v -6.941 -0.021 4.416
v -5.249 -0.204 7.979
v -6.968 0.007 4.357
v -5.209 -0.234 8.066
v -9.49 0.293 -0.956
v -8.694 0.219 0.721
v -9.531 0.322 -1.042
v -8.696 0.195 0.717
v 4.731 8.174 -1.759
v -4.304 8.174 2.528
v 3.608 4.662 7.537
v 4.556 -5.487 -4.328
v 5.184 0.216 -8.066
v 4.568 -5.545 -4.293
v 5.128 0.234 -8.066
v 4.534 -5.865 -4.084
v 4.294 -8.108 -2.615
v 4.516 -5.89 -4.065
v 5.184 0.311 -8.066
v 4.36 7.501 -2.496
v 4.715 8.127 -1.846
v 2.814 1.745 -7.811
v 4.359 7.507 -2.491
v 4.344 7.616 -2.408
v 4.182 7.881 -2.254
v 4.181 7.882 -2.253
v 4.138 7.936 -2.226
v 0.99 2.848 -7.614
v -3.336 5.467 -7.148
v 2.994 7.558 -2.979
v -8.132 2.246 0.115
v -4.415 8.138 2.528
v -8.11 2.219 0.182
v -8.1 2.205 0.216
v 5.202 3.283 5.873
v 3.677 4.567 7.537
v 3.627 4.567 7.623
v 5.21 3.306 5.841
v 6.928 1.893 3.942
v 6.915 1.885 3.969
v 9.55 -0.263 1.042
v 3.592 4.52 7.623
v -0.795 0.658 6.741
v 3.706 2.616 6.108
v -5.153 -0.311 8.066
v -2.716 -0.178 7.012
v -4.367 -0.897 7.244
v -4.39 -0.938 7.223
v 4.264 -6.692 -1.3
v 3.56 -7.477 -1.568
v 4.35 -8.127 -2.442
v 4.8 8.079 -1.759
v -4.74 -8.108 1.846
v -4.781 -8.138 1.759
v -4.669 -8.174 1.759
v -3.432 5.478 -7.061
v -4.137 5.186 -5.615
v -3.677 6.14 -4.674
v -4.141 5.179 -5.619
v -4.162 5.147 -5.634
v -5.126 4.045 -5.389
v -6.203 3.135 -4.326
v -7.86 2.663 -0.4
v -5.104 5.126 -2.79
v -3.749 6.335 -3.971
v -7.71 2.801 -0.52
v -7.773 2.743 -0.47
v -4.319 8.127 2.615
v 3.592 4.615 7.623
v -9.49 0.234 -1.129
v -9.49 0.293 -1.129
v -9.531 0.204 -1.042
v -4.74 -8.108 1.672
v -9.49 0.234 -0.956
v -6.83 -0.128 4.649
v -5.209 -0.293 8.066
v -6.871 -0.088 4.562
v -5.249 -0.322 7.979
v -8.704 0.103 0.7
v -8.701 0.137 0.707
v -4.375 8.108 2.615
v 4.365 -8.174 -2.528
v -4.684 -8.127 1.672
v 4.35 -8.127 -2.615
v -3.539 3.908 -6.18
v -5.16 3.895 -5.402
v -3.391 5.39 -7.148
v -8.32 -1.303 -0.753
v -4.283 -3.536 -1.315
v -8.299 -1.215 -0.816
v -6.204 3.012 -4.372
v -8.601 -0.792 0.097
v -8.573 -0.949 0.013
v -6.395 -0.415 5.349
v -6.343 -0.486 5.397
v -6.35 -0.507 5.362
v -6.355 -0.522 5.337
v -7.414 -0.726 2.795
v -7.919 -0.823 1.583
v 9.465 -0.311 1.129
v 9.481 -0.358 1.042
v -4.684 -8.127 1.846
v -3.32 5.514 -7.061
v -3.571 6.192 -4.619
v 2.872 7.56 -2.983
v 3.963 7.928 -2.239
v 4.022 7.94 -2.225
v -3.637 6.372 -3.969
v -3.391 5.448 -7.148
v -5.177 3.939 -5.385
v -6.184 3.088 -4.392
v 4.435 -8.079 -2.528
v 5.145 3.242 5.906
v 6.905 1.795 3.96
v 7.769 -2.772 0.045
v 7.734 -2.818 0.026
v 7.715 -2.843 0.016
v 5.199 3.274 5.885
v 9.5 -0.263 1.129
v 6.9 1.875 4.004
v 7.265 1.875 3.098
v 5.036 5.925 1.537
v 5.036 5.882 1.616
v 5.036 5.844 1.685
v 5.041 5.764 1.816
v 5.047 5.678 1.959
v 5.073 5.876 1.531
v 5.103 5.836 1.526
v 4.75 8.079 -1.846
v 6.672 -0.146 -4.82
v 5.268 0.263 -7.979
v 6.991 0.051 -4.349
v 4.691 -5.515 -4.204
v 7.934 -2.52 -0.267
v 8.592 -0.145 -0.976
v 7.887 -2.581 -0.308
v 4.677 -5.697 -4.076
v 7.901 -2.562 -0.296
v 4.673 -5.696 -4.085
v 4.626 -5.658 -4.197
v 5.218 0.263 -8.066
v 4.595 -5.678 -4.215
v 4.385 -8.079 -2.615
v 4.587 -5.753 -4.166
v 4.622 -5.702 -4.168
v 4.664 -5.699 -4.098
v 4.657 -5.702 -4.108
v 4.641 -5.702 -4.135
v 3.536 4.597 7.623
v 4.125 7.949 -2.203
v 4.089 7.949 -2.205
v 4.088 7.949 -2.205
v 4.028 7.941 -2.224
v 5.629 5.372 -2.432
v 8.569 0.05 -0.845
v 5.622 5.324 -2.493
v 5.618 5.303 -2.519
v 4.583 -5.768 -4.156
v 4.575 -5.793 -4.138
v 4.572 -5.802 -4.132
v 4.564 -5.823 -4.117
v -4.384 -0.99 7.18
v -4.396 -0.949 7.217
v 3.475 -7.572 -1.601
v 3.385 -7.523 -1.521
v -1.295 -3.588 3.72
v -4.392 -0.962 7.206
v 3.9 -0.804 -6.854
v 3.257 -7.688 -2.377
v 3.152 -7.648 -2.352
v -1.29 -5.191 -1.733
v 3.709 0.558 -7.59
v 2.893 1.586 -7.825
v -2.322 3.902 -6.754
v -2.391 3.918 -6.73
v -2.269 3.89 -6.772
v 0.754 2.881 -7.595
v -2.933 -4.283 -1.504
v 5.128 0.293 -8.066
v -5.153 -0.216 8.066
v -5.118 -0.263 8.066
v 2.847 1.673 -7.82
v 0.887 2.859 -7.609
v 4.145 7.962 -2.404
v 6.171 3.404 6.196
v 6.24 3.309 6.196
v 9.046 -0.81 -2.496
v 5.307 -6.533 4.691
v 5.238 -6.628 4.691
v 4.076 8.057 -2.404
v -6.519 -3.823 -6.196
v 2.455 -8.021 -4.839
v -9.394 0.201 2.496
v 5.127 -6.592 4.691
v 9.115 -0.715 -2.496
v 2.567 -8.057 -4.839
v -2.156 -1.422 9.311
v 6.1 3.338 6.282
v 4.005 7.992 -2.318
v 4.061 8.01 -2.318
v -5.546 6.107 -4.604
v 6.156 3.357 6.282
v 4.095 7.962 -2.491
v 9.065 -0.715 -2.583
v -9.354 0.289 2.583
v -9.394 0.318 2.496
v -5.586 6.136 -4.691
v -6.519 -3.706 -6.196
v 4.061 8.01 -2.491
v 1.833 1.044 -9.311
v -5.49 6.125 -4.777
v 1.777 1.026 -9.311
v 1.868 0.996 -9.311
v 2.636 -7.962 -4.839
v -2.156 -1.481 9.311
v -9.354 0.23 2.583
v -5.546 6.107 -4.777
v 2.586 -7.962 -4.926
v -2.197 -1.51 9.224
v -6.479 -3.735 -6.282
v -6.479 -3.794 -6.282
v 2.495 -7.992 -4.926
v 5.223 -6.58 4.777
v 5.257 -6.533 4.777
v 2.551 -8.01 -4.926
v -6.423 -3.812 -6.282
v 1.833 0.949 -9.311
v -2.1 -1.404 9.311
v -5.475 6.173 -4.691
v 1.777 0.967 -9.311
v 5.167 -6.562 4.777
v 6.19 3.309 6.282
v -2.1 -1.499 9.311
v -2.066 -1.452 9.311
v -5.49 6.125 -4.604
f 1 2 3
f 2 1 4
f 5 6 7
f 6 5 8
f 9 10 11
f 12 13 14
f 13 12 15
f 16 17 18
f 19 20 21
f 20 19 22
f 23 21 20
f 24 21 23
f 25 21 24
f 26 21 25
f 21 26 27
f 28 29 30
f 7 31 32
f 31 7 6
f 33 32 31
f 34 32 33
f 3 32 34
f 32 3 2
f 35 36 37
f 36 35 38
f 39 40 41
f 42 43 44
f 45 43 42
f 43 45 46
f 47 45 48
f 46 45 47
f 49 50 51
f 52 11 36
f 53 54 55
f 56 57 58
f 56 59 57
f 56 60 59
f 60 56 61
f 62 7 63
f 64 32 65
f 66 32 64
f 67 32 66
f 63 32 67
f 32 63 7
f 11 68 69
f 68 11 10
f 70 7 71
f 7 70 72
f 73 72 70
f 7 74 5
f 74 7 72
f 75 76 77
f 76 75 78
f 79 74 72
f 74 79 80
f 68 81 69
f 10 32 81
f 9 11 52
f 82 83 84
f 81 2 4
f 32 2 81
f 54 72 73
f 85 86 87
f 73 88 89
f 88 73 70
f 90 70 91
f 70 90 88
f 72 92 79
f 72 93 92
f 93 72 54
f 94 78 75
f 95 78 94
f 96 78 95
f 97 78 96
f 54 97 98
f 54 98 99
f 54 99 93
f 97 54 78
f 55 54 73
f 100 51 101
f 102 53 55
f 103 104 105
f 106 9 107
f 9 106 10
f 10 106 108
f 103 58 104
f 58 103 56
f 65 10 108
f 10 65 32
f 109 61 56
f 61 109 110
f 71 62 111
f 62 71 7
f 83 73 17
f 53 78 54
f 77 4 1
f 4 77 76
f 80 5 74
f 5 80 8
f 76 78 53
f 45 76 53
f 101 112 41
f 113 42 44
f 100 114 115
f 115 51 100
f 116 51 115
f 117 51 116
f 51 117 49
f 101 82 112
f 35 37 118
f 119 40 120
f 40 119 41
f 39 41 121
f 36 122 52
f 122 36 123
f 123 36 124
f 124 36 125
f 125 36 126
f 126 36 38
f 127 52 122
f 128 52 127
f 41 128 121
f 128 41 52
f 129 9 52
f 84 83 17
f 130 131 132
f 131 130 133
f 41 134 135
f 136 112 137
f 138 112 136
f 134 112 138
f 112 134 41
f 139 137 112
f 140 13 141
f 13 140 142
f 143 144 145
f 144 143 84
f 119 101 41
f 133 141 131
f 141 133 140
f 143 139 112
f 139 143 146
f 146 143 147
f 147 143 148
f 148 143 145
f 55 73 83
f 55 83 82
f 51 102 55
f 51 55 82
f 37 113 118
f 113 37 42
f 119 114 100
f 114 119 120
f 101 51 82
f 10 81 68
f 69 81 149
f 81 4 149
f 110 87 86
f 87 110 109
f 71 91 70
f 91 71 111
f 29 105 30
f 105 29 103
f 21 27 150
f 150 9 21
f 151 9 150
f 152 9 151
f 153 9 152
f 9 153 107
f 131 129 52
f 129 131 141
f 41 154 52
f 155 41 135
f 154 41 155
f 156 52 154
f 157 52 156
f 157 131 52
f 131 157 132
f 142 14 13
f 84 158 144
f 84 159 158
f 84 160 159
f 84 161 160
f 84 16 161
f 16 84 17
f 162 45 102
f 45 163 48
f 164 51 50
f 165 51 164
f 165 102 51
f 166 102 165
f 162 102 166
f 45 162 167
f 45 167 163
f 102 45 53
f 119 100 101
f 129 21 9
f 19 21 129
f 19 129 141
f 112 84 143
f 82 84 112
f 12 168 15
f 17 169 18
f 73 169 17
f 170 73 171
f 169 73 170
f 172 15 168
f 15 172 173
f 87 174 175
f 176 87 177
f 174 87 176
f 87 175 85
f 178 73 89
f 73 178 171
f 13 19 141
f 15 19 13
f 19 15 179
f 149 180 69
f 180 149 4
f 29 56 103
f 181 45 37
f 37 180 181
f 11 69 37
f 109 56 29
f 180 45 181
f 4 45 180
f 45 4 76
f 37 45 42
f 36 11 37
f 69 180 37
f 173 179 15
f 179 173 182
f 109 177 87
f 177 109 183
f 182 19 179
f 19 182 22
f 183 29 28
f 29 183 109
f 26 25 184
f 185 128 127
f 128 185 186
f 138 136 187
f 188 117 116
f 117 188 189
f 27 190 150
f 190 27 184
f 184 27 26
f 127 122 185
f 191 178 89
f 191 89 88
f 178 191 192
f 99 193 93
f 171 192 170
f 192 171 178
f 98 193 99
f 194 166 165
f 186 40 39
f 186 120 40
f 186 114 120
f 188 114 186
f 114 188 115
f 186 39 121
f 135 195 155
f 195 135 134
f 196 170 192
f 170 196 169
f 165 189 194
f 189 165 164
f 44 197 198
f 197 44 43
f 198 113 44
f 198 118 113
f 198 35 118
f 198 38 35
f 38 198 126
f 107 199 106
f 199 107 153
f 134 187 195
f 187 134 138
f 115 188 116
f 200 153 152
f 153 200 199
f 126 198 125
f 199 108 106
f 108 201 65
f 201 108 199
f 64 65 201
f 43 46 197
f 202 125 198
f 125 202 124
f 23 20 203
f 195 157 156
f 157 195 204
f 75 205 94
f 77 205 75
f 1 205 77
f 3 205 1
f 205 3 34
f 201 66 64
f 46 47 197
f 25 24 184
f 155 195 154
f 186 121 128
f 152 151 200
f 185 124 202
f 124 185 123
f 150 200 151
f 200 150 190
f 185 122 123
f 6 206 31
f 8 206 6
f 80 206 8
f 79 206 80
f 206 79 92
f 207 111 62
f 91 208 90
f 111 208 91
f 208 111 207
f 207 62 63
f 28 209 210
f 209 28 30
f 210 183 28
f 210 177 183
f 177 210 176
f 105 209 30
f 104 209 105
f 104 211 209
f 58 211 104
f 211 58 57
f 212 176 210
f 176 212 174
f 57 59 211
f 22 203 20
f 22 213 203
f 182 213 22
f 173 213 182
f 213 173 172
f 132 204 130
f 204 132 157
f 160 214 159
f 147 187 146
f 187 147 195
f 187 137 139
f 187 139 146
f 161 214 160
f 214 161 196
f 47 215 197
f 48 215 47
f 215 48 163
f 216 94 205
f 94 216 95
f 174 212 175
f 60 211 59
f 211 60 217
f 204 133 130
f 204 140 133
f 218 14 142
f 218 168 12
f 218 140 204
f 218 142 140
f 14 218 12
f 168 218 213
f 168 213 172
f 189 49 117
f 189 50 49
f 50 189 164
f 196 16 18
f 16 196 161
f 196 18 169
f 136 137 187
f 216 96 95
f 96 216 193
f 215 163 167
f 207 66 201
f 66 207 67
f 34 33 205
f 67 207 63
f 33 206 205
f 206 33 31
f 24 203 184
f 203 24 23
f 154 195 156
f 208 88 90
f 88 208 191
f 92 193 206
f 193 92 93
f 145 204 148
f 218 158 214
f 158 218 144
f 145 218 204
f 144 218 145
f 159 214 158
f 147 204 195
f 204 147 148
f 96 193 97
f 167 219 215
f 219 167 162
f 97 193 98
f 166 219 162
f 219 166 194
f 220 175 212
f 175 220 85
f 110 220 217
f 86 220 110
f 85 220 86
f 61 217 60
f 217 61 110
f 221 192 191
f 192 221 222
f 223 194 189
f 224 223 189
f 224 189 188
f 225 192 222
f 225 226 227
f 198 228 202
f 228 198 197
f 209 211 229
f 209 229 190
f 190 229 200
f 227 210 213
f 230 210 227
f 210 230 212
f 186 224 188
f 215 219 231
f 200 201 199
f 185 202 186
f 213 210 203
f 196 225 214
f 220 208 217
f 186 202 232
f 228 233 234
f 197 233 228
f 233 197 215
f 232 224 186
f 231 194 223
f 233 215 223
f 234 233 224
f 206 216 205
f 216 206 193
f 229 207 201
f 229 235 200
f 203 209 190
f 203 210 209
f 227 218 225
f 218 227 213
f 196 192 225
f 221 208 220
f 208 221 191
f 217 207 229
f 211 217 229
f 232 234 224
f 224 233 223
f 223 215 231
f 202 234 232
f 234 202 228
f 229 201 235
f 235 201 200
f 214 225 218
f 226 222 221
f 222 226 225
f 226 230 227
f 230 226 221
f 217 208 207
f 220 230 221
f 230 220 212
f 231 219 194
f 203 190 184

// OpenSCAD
// Auto-generated OpenSCAD file

    inner_points = 10*[[-0.9313235840465552, 0.025941713534936496, 0.24961039887898973], [0.18176070420337553, 0.09962140742080969, -0.9224171855702517], [-0.21156256215452457, -0.14515796252296415, 0.9224171855702517], [0.9015217260954063, -0.07147826863709097, -0.24961039887898973], [-0.6438494477287671, -0.3764461593931605, -0.6195516232254873], [-0.5505502074210448, 0.607754695616786, -0.46907262550257495], [0.5207483494698958, -0.6532912507189405, 0.46907262550257495], [0.6140475897776181, 0.330909604291006, 0.6195516232254873], [0.2535803612941774, -0.7962352175813989, -0.48391650792537955], [0.4045417032366162, 0.7962352175814017, -0.24043637501668932]];

    outer_points = 10*[[-0.46997284627252917, -0.8078951994968868, 0.17589589984947596], [-0.43345305778897786, 0.8078951994968868, 0.25284835477167783], [0.43345305778897786, -0.8078951994968868, -0.25284835477167783], [0.46997284627252917, 0.8078951994968868, -0.17589589984947596], [-0.9449617853062939, 0.026321601166102375, -0.10422521197036727], [-0.5168120337823261, -0.026321601166102375, 0.7979479884286332], [0.5168120337823261, 0.026321601166102375, -0.7979479884286332], [0.9449617853062939, -0.026321601166102375, 0.10422521197036727], [-0.3350951898479052, 0.5418959379620255, -0.7060938346625941], [0.3576656603926969, 0.45671744731188046, 0.753653067322259]];

    // Convex hull for inner set (I)
    module inner_hull() {
        hull() {
            for (p = inner_points) {
                translate(p) sphere(r=0.1);
            }
        }
    }

    // Convex hull for outer set (O) minus inner hull (O \ I)
    module outer_minus_inner() {
        difference() {
            hull() {
                for (p = outer_points) {
                    translate(p) sphere(r=0.1);
                }
            }
            inner_hull(); // Subtract inner hull
        }
    }

    // Convex hull for outer set (O) minus all translated inner hulls
    module outer_minus_AllTranslationInner() {
        difference() {
            hull() {
                for (p = outer_points) {
                    translate(p) sphere(r=0.1);
                }
            }
            hull() {
                translate([0,0,50]) inner_hull();
                translate([0,0,-50]) inner_hull();
            }; // Subtract translated inner hulls
        }
    }

    // Difference between outer_minus_inner and outer_minus_AllTranslationInner
    module outer_minus_inner_diff() {
        difference() {
            // Outer minus inner
            difference() {
                hull() {
                    for (p = outer_points) {
                        translate(p) sphere(r=0.1);
                    }
                }
                inner_hull();
            }

            // Subtract Outer minus AllTranslationInner
            difference() {
                hull() {
                    for (p = outer_points) {
                        translate(p) sphere(r=0.1);
                    }
                }
                hull() {
                    translate([0,0,50]) inner_hull();
                    translate([0,0,-50]) inner_hull();
                };
            }
        }
    }

    // Rendering all with colors applied
    color([1, 0, 0, 0.5]) inner_hull(); // Transparent red
    color([0, 1, 0, 1]) outer_minus_AllTranslationInner(); // Opaque green
    color([1, 1, 0, 1]) outer_minus_inner_diff(); // Opaque yellow
    
